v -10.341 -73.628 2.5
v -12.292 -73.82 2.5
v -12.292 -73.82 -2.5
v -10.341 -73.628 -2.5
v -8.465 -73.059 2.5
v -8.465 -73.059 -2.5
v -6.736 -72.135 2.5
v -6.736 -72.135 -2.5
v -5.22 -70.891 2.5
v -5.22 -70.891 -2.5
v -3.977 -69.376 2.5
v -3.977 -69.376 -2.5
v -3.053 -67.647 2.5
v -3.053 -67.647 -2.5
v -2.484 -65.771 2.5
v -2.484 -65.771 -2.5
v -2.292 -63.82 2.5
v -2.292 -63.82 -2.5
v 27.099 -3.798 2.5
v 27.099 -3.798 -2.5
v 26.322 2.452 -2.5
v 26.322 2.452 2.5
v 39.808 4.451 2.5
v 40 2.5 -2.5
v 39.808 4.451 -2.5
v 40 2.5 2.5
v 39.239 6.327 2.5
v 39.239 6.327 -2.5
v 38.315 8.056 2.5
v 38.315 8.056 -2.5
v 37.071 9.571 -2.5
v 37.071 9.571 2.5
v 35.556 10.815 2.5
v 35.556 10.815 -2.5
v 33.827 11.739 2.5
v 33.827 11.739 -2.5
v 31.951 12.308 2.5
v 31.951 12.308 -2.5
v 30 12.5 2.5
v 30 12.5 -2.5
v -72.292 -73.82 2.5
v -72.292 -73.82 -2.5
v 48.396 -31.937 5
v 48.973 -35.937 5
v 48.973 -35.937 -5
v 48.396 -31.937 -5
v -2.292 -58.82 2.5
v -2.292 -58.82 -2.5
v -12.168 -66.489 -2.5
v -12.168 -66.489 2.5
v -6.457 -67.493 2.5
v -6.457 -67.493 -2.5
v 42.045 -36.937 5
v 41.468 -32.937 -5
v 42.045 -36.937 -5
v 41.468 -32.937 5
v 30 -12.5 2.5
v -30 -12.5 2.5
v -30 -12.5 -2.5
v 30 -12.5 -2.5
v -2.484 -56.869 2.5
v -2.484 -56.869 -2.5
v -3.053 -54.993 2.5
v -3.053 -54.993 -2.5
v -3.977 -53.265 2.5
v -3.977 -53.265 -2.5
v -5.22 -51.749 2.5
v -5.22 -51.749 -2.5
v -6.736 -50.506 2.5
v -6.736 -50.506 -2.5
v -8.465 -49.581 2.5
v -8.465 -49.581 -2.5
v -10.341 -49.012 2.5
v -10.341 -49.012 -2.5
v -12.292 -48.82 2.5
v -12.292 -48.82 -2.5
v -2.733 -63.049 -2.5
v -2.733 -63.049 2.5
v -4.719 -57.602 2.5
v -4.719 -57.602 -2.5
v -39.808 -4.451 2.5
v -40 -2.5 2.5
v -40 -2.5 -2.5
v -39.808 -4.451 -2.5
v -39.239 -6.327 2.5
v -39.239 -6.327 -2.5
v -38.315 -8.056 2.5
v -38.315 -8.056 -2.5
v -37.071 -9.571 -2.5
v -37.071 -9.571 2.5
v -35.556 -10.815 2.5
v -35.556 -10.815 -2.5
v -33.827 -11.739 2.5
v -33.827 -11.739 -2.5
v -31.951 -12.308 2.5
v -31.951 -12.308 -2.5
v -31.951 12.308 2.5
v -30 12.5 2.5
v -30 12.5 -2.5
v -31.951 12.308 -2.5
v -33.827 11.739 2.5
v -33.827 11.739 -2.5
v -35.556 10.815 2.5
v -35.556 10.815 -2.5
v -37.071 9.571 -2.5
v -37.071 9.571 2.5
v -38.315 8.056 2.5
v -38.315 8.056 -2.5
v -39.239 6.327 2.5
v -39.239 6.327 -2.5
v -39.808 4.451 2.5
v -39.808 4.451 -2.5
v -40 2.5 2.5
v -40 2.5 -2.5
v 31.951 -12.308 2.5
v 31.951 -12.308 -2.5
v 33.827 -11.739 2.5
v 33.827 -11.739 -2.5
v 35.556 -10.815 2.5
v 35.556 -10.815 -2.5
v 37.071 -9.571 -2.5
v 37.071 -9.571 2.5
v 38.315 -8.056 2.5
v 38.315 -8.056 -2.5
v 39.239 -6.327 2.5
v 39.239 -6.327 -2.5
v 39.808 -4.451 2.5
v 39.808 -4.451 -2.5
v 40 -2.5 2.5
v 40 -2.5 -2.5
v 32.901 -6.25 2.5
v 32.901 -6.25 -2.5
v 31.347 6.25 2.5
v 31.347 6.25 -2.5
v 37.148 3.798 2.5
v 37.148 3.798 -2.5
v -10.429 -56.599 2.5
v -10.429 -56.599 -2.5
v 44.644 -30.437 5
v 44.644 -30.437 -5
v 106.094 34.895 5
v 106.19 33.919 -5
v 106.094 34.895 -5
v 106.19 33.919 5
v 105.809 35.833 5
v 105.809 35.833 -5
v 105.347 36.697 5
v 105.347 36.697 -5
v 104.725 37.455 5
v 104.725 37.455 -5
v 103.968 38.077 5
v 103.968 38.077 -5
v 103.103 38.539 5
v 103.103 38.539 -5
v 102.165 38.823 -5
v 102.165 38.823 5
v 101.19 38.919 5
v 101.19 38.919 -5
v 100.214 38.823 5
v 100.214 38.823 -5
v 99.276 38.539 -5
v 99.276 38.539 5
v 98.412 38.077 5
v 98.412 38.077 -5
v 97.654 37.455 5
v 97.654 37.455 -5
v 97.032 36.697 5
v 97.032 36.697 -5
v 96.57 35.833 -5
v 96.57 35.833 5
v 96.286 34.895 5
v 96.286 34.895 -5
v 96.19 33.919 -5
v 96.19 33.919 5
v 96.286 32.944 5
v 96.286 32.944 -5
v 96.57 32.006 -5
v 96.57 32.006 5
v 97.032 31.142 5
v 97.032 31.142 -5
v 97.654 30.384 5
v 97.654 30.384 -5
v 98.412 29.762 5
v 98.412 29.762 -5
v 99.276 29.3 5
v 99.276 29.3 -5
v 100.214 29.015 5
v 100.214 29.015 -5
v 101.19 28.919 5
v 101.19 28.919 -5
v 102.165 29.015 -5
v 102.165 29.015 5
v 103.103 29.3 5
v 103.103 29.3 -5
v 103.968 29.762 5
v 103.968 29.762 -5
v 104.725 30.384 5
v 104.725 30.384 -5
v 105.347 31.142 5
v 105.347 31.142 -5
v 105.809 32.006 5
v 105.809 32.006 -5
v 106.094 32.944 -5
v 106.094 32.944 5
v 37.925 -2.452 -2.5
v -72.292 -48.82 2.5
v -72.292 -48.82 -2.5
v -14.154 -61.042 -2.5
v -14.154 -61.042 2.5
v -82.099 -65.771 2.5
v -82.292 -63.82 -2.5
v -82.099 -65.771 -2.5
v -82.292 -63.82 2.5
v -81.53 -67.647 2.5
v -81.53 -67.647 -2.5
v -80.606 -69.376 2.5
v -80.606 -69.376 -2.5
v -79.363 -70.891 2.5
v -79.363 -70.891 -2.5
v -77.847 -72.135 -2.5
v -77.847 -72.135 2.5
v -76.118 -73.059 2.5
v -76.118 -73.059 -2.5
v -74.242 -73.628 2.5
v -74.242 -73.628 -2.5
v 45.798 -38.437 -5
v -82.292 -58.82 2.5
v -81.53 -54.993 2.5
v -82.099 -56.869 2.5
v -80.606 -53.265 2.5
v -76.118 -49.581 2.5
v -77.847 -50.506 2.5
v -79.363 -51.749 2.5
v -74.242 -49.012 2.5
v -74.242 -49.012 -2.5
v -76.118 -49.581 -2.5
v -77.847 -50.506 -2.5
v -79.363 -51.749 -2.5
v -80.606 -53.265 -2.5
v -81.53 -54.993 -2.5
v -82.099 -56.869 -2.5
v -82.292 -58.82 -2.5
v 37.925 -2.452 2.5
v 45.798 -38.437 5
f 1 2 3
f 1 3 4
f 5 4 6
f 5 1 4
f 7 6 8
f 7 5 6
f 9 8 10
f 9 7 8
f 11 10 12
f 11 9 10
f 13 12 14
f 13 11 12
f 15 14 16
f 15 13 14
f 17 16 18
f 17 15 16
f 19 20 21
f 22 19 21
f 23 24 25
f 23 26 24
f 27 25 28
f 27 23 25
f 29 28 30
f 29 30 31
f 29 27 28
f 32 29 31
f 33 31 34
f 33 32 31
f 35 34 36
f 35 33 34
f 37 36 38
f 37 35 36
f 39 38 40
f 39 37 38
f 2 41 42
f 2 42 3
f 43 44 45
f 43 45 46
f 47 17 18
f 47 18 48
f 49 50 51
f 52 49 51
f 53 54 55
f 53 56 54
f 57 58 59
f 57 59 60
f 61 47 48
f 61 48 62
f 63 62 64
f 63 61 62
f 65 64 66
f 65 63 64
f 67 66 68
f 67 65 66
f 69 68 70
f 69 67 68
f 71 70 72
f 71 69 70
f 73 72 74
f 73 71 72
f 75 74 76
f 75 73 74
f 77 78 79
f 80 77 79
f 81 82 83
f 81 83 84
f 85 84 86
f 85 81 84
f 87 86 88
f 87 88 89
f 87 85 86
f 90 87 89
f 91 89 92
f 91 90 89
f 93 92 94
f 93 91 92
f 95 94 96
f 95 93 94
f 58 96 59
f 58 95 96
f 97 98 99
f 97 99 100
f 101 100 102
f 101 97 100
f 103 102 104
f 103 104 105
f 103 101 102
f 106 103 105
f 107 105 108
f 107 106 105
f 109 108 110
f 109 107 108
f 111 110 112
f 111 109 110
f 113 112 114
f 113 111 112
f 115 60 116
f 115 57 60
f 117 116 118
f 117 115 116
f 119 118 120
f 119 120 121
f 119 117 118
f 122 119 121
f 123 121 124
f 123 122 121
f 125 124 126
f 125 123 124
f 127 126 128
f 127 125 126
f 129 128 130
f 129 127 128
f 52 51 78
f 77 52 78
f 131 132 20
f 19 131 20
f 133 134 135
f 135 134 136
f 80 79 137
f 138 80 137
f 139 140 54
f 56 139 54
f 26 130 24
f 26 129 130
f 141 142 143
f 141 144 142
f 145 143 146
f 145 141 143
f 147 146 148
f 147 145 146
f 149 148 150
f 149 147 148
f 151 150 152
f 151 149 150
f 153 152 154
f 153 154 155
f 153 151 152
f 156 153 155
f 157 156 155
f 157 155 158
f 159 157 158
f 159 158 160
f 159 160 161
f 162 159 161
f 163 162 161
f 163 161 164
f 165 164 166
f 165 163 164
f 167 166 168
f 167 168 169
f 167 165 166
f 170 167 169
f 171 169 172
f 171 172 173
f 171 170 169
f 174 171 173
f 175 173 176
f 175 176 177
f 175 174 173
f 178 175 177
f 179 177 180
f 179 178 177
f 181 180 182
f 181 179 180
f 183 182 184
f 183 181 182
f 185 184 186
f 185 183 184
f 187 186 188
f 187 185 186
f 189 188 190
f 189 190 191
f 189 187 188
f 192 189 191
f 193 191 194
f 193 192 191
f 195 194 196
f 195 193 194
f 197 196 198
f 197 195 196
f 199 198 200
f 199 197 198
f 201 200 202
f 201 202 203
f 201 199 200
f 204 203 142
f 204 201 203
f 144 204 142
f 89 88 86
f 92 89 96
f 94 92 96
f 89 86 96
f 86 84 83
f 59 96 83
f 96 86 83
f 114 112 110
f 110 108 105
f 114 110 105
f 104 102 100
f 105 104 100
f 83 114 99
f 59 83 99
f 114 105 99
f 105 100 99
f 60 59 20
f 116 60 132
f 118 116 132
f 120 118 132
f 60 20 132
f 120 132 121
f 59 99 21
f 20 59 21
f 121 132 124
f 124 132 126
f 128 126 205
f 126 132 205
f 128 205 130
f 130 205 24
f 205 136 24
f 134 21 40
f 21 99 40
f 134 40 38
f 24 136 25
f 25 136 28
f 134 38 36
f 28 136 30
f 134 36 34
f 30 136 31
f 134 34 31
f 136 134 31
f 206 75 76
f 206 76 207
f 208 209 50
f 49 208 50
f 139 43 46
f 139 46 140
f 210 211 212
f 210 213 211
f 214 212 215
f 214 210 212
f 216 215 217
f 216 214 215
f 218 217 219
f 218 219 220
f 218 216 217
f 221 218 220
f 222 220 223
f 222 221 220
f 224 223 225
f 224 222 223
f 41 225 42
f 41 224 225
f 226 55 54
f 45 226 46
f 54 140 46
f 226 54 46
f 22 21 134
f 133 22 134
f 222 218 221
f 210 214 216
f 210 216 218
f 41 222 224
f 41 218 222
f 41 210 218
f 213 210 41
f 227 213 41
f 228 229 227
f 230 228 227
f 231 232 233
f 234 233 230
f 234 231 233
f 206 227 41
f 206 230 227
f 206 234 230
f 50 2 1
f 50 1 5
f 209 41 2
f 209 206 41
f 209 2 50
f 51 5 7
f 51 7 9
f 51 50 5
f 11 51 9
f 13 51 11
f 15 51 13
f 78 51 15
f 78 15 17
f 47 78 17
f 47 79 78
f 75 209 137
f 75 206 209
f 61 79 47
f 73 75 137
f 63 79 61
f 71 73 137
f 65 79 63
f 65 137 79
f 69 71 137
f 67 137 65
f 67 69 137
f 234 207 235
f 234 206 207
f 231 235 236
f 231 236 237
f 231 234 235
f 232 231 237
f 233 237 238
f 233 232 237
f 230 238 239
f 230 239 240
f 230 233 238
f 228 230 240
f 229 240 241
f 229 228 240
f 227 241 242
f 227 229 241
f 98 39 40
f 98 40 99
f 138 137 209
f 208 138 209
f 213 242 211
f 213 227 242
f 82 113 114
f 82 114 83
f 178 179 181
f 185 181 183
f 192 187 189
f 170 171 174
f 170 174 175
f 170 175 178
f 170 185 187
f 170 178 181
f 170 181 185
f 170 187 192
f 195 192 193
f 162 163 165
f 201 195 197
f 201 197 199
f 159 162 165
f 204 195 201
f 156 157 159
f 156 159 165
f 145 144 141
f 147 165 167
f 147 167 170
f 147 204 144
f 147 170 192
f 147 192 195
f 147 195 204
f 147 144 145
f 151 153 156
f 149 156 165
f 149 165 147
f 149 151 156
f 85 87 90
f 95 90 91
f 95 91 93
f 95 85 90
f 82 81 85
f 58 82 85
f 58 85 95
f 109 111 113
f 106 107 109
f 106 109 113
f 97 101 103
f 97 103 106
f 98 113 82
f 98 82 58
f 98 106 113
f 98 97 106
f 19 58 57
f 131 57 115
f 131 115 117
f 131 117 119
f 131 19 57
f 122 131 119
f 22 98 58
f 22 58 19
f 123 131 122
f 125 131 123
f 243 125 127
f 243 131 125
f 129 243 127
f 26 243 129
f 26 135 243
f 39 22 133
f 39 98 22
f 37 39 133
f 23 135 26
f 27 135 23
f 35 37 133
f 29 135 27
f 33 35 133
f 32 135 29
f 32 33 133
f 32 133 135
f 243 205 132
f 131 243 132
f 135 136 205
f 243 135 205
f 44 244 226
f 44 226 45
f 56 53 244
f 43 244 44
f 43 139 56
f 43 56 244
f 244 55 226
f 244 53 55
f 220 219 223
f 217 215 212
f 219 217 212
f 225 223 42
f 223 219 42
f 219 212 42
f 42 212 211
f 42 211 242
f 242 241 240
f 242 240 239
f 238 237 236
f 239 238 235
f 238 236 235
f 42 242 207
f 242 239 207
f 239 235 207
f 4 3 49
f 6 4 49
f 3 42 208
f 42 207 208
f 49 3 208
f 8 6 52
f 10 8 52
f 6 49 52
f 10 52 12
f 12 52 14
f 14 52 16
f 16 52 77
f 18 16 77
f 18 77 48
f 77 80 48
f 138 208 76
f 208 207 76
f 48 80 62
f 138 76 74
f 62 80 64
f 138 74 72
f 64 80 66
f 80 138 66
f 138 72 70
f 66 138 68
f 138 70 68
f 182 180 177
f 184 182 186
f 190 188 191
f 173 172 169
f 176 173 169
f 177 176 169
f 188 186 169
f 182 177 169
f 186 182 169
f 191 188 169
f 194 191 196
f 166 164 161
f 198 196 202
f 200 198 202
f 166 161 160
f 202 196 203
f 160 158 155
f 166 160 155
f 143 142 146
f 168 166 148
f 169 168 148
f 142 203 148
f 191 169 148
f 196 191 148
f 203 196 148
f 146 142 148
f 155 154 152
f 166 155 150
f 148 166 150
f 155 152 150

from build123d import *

# Parameters (mm, degrees)
F1_DEPTH  = 2.5
F2_R      = 3.5576689951
F3_DEPTH  = 20
F4_DEPTH  = 20
F6_DEPTH  = 2.5
F8_DEPTH  = 6
F9_R      = 5
F10_DEPTH = 5
F12_DEPTH = 5


with BuildPart() as f1:
    # F0 (on Top) → F1 (new body, symmetric)
    with BuildSketch(Plane.XY):
        with BuildLine():
            ThreePointArc((40, 2.5), (37.0710678119, 9.5710678119), (30, 12.5))
            Line((30, 12.5), (-30, 12.5))
            ThreePointArc((-30, 12.5), (-37.0710678119, 9.5710678119), (-40, 2.5))
            Line((-40, 2.5), (-40, -2.5))
            ThreePointArc((-40, -2.5), (-37.0710678119, -9.5710678119), (-30, -12.5))
            Line((-30, -12.5), (30, -12.5))
            ThreePointArc((30, -12.5), (37.0710678119, -9.5710678119), (40, -2.5))
            Line((40, -2.5), (40, 2.5))
        make_face()
    extrude(amount=F1_DEPTH, both=True)

    # F2 (on face) → F3 (cut)
    with BuildSketch(Plane(origin=(0, 0, -2.5), x_dir=(1, 0, 0), z_dir=(0, 0, -1))):
        Polygon((32.900771254, 6.2504104384), (27.099228746, 3.7981559477), (26.3221721775, -2.4522544906), (31.3466581169, -6.2504104384), (37.1482006249, -3.7981559477), (37.9252571934, 2.4522544906), align=None)
        with Locations((32.1237146854, 0)):
            Circle(F2_R, mode=Mode.SUBTRACT)
    extrude(amount=-F3_DEPTH, mode=Mode.SUBTRACT)

    # F4 (cut): a face of the model
    f4_faces = [f1.faces().sort_by_distance(p)[0] for p in [
        (32.1237146854, 0, -2.5),
    ]]
    extrude(f4_faces, amount=-F4_DEPTH, mode=Mode.SUBTRACT)


with BuildPart() as f6:
    # F5 (on Top) → F6 (new body, symmetric)
    with BuildSketch(Plane.XY):
        with BuildLine():
            ThreePointArc((-82.2915453091, -63.8202903937), (-79.362613121, -70.8913582056), (-72.2915453091, -73.8202903937))
            Line((-72.2915453091, -73.8202903937), (-12.2915453091, -73.8202903937))
            ThreePointArc((-12.2915453091, -73.8202903937), (-5.2204774973, -70.8913582056), (-2.2915453091, -63.8202903937))
            Line((-2.2915453091, -63.8202903937), (-2.2915453091, -58.8202903937))
            ThreePointArc((-2.2915453091, -58.8202903937), (-5.2204774973, -51.7492225819), (-12.2915453091, -48.8202903937))
            Line((-12.2915453091, -48.8202903937), (-72.2915453091, -48.8202903937))
            ThreePointArc((-72.2915453091, -48.8202903937), (-79.362613121, -51.7492225819), (-82.2915453091, -58.8202903937))
            Line((-82.2915453091, -58.8202903937), (-82.2915453091, -63.8202903937))
        make_face()
    extrude(amount=F6_DEPTH, both=True)

    # F7 (on face) → F8 (cut)
    with BuildSketch(Plane.XY.offset(2.5)):
        Polygon((-10.4293150007, -56.5985203377), (-14.1537756176, -61.0420604498), (-12.1677873062, -66.4893080154), (-6.4573383779, -67.493015469), (-2.732877761, -63.0494753569), (-4.7188660724, -57.6022277912), align=None)
    extrude(amount=-F8_DEPTH, mode=Mode.SUBTRACT)


with BuildPart() as f10:
    # F9 (on Top) → F10 (new body, symmetric)
    with BuildSketch(Plane.XY):
        with Locations((101.1897652568, 33.9193832354)):
            Circle(F9_R)
    extrude(amount=F10_DEPTH, both=True)


with BuildPart() as f12:
    # F11 (on Top) → F12 (new body, symmetric)
    with BuildSketch(Plane.XY):
        Polygon((42.0450188959, -36.9367471334), (45.7976388735, -38.4371392945), (48.9733265895, -35.9374711437), (48.3963943278, -31.9374108318), (44.6437743502, -30.4370186707), (41.4680866343, -32.9366868215), align=None)
    extrude(amount=F12_DEPTH, both=True)


solid = Compound([f1.part, f6.part, f10.part, f12.part])
